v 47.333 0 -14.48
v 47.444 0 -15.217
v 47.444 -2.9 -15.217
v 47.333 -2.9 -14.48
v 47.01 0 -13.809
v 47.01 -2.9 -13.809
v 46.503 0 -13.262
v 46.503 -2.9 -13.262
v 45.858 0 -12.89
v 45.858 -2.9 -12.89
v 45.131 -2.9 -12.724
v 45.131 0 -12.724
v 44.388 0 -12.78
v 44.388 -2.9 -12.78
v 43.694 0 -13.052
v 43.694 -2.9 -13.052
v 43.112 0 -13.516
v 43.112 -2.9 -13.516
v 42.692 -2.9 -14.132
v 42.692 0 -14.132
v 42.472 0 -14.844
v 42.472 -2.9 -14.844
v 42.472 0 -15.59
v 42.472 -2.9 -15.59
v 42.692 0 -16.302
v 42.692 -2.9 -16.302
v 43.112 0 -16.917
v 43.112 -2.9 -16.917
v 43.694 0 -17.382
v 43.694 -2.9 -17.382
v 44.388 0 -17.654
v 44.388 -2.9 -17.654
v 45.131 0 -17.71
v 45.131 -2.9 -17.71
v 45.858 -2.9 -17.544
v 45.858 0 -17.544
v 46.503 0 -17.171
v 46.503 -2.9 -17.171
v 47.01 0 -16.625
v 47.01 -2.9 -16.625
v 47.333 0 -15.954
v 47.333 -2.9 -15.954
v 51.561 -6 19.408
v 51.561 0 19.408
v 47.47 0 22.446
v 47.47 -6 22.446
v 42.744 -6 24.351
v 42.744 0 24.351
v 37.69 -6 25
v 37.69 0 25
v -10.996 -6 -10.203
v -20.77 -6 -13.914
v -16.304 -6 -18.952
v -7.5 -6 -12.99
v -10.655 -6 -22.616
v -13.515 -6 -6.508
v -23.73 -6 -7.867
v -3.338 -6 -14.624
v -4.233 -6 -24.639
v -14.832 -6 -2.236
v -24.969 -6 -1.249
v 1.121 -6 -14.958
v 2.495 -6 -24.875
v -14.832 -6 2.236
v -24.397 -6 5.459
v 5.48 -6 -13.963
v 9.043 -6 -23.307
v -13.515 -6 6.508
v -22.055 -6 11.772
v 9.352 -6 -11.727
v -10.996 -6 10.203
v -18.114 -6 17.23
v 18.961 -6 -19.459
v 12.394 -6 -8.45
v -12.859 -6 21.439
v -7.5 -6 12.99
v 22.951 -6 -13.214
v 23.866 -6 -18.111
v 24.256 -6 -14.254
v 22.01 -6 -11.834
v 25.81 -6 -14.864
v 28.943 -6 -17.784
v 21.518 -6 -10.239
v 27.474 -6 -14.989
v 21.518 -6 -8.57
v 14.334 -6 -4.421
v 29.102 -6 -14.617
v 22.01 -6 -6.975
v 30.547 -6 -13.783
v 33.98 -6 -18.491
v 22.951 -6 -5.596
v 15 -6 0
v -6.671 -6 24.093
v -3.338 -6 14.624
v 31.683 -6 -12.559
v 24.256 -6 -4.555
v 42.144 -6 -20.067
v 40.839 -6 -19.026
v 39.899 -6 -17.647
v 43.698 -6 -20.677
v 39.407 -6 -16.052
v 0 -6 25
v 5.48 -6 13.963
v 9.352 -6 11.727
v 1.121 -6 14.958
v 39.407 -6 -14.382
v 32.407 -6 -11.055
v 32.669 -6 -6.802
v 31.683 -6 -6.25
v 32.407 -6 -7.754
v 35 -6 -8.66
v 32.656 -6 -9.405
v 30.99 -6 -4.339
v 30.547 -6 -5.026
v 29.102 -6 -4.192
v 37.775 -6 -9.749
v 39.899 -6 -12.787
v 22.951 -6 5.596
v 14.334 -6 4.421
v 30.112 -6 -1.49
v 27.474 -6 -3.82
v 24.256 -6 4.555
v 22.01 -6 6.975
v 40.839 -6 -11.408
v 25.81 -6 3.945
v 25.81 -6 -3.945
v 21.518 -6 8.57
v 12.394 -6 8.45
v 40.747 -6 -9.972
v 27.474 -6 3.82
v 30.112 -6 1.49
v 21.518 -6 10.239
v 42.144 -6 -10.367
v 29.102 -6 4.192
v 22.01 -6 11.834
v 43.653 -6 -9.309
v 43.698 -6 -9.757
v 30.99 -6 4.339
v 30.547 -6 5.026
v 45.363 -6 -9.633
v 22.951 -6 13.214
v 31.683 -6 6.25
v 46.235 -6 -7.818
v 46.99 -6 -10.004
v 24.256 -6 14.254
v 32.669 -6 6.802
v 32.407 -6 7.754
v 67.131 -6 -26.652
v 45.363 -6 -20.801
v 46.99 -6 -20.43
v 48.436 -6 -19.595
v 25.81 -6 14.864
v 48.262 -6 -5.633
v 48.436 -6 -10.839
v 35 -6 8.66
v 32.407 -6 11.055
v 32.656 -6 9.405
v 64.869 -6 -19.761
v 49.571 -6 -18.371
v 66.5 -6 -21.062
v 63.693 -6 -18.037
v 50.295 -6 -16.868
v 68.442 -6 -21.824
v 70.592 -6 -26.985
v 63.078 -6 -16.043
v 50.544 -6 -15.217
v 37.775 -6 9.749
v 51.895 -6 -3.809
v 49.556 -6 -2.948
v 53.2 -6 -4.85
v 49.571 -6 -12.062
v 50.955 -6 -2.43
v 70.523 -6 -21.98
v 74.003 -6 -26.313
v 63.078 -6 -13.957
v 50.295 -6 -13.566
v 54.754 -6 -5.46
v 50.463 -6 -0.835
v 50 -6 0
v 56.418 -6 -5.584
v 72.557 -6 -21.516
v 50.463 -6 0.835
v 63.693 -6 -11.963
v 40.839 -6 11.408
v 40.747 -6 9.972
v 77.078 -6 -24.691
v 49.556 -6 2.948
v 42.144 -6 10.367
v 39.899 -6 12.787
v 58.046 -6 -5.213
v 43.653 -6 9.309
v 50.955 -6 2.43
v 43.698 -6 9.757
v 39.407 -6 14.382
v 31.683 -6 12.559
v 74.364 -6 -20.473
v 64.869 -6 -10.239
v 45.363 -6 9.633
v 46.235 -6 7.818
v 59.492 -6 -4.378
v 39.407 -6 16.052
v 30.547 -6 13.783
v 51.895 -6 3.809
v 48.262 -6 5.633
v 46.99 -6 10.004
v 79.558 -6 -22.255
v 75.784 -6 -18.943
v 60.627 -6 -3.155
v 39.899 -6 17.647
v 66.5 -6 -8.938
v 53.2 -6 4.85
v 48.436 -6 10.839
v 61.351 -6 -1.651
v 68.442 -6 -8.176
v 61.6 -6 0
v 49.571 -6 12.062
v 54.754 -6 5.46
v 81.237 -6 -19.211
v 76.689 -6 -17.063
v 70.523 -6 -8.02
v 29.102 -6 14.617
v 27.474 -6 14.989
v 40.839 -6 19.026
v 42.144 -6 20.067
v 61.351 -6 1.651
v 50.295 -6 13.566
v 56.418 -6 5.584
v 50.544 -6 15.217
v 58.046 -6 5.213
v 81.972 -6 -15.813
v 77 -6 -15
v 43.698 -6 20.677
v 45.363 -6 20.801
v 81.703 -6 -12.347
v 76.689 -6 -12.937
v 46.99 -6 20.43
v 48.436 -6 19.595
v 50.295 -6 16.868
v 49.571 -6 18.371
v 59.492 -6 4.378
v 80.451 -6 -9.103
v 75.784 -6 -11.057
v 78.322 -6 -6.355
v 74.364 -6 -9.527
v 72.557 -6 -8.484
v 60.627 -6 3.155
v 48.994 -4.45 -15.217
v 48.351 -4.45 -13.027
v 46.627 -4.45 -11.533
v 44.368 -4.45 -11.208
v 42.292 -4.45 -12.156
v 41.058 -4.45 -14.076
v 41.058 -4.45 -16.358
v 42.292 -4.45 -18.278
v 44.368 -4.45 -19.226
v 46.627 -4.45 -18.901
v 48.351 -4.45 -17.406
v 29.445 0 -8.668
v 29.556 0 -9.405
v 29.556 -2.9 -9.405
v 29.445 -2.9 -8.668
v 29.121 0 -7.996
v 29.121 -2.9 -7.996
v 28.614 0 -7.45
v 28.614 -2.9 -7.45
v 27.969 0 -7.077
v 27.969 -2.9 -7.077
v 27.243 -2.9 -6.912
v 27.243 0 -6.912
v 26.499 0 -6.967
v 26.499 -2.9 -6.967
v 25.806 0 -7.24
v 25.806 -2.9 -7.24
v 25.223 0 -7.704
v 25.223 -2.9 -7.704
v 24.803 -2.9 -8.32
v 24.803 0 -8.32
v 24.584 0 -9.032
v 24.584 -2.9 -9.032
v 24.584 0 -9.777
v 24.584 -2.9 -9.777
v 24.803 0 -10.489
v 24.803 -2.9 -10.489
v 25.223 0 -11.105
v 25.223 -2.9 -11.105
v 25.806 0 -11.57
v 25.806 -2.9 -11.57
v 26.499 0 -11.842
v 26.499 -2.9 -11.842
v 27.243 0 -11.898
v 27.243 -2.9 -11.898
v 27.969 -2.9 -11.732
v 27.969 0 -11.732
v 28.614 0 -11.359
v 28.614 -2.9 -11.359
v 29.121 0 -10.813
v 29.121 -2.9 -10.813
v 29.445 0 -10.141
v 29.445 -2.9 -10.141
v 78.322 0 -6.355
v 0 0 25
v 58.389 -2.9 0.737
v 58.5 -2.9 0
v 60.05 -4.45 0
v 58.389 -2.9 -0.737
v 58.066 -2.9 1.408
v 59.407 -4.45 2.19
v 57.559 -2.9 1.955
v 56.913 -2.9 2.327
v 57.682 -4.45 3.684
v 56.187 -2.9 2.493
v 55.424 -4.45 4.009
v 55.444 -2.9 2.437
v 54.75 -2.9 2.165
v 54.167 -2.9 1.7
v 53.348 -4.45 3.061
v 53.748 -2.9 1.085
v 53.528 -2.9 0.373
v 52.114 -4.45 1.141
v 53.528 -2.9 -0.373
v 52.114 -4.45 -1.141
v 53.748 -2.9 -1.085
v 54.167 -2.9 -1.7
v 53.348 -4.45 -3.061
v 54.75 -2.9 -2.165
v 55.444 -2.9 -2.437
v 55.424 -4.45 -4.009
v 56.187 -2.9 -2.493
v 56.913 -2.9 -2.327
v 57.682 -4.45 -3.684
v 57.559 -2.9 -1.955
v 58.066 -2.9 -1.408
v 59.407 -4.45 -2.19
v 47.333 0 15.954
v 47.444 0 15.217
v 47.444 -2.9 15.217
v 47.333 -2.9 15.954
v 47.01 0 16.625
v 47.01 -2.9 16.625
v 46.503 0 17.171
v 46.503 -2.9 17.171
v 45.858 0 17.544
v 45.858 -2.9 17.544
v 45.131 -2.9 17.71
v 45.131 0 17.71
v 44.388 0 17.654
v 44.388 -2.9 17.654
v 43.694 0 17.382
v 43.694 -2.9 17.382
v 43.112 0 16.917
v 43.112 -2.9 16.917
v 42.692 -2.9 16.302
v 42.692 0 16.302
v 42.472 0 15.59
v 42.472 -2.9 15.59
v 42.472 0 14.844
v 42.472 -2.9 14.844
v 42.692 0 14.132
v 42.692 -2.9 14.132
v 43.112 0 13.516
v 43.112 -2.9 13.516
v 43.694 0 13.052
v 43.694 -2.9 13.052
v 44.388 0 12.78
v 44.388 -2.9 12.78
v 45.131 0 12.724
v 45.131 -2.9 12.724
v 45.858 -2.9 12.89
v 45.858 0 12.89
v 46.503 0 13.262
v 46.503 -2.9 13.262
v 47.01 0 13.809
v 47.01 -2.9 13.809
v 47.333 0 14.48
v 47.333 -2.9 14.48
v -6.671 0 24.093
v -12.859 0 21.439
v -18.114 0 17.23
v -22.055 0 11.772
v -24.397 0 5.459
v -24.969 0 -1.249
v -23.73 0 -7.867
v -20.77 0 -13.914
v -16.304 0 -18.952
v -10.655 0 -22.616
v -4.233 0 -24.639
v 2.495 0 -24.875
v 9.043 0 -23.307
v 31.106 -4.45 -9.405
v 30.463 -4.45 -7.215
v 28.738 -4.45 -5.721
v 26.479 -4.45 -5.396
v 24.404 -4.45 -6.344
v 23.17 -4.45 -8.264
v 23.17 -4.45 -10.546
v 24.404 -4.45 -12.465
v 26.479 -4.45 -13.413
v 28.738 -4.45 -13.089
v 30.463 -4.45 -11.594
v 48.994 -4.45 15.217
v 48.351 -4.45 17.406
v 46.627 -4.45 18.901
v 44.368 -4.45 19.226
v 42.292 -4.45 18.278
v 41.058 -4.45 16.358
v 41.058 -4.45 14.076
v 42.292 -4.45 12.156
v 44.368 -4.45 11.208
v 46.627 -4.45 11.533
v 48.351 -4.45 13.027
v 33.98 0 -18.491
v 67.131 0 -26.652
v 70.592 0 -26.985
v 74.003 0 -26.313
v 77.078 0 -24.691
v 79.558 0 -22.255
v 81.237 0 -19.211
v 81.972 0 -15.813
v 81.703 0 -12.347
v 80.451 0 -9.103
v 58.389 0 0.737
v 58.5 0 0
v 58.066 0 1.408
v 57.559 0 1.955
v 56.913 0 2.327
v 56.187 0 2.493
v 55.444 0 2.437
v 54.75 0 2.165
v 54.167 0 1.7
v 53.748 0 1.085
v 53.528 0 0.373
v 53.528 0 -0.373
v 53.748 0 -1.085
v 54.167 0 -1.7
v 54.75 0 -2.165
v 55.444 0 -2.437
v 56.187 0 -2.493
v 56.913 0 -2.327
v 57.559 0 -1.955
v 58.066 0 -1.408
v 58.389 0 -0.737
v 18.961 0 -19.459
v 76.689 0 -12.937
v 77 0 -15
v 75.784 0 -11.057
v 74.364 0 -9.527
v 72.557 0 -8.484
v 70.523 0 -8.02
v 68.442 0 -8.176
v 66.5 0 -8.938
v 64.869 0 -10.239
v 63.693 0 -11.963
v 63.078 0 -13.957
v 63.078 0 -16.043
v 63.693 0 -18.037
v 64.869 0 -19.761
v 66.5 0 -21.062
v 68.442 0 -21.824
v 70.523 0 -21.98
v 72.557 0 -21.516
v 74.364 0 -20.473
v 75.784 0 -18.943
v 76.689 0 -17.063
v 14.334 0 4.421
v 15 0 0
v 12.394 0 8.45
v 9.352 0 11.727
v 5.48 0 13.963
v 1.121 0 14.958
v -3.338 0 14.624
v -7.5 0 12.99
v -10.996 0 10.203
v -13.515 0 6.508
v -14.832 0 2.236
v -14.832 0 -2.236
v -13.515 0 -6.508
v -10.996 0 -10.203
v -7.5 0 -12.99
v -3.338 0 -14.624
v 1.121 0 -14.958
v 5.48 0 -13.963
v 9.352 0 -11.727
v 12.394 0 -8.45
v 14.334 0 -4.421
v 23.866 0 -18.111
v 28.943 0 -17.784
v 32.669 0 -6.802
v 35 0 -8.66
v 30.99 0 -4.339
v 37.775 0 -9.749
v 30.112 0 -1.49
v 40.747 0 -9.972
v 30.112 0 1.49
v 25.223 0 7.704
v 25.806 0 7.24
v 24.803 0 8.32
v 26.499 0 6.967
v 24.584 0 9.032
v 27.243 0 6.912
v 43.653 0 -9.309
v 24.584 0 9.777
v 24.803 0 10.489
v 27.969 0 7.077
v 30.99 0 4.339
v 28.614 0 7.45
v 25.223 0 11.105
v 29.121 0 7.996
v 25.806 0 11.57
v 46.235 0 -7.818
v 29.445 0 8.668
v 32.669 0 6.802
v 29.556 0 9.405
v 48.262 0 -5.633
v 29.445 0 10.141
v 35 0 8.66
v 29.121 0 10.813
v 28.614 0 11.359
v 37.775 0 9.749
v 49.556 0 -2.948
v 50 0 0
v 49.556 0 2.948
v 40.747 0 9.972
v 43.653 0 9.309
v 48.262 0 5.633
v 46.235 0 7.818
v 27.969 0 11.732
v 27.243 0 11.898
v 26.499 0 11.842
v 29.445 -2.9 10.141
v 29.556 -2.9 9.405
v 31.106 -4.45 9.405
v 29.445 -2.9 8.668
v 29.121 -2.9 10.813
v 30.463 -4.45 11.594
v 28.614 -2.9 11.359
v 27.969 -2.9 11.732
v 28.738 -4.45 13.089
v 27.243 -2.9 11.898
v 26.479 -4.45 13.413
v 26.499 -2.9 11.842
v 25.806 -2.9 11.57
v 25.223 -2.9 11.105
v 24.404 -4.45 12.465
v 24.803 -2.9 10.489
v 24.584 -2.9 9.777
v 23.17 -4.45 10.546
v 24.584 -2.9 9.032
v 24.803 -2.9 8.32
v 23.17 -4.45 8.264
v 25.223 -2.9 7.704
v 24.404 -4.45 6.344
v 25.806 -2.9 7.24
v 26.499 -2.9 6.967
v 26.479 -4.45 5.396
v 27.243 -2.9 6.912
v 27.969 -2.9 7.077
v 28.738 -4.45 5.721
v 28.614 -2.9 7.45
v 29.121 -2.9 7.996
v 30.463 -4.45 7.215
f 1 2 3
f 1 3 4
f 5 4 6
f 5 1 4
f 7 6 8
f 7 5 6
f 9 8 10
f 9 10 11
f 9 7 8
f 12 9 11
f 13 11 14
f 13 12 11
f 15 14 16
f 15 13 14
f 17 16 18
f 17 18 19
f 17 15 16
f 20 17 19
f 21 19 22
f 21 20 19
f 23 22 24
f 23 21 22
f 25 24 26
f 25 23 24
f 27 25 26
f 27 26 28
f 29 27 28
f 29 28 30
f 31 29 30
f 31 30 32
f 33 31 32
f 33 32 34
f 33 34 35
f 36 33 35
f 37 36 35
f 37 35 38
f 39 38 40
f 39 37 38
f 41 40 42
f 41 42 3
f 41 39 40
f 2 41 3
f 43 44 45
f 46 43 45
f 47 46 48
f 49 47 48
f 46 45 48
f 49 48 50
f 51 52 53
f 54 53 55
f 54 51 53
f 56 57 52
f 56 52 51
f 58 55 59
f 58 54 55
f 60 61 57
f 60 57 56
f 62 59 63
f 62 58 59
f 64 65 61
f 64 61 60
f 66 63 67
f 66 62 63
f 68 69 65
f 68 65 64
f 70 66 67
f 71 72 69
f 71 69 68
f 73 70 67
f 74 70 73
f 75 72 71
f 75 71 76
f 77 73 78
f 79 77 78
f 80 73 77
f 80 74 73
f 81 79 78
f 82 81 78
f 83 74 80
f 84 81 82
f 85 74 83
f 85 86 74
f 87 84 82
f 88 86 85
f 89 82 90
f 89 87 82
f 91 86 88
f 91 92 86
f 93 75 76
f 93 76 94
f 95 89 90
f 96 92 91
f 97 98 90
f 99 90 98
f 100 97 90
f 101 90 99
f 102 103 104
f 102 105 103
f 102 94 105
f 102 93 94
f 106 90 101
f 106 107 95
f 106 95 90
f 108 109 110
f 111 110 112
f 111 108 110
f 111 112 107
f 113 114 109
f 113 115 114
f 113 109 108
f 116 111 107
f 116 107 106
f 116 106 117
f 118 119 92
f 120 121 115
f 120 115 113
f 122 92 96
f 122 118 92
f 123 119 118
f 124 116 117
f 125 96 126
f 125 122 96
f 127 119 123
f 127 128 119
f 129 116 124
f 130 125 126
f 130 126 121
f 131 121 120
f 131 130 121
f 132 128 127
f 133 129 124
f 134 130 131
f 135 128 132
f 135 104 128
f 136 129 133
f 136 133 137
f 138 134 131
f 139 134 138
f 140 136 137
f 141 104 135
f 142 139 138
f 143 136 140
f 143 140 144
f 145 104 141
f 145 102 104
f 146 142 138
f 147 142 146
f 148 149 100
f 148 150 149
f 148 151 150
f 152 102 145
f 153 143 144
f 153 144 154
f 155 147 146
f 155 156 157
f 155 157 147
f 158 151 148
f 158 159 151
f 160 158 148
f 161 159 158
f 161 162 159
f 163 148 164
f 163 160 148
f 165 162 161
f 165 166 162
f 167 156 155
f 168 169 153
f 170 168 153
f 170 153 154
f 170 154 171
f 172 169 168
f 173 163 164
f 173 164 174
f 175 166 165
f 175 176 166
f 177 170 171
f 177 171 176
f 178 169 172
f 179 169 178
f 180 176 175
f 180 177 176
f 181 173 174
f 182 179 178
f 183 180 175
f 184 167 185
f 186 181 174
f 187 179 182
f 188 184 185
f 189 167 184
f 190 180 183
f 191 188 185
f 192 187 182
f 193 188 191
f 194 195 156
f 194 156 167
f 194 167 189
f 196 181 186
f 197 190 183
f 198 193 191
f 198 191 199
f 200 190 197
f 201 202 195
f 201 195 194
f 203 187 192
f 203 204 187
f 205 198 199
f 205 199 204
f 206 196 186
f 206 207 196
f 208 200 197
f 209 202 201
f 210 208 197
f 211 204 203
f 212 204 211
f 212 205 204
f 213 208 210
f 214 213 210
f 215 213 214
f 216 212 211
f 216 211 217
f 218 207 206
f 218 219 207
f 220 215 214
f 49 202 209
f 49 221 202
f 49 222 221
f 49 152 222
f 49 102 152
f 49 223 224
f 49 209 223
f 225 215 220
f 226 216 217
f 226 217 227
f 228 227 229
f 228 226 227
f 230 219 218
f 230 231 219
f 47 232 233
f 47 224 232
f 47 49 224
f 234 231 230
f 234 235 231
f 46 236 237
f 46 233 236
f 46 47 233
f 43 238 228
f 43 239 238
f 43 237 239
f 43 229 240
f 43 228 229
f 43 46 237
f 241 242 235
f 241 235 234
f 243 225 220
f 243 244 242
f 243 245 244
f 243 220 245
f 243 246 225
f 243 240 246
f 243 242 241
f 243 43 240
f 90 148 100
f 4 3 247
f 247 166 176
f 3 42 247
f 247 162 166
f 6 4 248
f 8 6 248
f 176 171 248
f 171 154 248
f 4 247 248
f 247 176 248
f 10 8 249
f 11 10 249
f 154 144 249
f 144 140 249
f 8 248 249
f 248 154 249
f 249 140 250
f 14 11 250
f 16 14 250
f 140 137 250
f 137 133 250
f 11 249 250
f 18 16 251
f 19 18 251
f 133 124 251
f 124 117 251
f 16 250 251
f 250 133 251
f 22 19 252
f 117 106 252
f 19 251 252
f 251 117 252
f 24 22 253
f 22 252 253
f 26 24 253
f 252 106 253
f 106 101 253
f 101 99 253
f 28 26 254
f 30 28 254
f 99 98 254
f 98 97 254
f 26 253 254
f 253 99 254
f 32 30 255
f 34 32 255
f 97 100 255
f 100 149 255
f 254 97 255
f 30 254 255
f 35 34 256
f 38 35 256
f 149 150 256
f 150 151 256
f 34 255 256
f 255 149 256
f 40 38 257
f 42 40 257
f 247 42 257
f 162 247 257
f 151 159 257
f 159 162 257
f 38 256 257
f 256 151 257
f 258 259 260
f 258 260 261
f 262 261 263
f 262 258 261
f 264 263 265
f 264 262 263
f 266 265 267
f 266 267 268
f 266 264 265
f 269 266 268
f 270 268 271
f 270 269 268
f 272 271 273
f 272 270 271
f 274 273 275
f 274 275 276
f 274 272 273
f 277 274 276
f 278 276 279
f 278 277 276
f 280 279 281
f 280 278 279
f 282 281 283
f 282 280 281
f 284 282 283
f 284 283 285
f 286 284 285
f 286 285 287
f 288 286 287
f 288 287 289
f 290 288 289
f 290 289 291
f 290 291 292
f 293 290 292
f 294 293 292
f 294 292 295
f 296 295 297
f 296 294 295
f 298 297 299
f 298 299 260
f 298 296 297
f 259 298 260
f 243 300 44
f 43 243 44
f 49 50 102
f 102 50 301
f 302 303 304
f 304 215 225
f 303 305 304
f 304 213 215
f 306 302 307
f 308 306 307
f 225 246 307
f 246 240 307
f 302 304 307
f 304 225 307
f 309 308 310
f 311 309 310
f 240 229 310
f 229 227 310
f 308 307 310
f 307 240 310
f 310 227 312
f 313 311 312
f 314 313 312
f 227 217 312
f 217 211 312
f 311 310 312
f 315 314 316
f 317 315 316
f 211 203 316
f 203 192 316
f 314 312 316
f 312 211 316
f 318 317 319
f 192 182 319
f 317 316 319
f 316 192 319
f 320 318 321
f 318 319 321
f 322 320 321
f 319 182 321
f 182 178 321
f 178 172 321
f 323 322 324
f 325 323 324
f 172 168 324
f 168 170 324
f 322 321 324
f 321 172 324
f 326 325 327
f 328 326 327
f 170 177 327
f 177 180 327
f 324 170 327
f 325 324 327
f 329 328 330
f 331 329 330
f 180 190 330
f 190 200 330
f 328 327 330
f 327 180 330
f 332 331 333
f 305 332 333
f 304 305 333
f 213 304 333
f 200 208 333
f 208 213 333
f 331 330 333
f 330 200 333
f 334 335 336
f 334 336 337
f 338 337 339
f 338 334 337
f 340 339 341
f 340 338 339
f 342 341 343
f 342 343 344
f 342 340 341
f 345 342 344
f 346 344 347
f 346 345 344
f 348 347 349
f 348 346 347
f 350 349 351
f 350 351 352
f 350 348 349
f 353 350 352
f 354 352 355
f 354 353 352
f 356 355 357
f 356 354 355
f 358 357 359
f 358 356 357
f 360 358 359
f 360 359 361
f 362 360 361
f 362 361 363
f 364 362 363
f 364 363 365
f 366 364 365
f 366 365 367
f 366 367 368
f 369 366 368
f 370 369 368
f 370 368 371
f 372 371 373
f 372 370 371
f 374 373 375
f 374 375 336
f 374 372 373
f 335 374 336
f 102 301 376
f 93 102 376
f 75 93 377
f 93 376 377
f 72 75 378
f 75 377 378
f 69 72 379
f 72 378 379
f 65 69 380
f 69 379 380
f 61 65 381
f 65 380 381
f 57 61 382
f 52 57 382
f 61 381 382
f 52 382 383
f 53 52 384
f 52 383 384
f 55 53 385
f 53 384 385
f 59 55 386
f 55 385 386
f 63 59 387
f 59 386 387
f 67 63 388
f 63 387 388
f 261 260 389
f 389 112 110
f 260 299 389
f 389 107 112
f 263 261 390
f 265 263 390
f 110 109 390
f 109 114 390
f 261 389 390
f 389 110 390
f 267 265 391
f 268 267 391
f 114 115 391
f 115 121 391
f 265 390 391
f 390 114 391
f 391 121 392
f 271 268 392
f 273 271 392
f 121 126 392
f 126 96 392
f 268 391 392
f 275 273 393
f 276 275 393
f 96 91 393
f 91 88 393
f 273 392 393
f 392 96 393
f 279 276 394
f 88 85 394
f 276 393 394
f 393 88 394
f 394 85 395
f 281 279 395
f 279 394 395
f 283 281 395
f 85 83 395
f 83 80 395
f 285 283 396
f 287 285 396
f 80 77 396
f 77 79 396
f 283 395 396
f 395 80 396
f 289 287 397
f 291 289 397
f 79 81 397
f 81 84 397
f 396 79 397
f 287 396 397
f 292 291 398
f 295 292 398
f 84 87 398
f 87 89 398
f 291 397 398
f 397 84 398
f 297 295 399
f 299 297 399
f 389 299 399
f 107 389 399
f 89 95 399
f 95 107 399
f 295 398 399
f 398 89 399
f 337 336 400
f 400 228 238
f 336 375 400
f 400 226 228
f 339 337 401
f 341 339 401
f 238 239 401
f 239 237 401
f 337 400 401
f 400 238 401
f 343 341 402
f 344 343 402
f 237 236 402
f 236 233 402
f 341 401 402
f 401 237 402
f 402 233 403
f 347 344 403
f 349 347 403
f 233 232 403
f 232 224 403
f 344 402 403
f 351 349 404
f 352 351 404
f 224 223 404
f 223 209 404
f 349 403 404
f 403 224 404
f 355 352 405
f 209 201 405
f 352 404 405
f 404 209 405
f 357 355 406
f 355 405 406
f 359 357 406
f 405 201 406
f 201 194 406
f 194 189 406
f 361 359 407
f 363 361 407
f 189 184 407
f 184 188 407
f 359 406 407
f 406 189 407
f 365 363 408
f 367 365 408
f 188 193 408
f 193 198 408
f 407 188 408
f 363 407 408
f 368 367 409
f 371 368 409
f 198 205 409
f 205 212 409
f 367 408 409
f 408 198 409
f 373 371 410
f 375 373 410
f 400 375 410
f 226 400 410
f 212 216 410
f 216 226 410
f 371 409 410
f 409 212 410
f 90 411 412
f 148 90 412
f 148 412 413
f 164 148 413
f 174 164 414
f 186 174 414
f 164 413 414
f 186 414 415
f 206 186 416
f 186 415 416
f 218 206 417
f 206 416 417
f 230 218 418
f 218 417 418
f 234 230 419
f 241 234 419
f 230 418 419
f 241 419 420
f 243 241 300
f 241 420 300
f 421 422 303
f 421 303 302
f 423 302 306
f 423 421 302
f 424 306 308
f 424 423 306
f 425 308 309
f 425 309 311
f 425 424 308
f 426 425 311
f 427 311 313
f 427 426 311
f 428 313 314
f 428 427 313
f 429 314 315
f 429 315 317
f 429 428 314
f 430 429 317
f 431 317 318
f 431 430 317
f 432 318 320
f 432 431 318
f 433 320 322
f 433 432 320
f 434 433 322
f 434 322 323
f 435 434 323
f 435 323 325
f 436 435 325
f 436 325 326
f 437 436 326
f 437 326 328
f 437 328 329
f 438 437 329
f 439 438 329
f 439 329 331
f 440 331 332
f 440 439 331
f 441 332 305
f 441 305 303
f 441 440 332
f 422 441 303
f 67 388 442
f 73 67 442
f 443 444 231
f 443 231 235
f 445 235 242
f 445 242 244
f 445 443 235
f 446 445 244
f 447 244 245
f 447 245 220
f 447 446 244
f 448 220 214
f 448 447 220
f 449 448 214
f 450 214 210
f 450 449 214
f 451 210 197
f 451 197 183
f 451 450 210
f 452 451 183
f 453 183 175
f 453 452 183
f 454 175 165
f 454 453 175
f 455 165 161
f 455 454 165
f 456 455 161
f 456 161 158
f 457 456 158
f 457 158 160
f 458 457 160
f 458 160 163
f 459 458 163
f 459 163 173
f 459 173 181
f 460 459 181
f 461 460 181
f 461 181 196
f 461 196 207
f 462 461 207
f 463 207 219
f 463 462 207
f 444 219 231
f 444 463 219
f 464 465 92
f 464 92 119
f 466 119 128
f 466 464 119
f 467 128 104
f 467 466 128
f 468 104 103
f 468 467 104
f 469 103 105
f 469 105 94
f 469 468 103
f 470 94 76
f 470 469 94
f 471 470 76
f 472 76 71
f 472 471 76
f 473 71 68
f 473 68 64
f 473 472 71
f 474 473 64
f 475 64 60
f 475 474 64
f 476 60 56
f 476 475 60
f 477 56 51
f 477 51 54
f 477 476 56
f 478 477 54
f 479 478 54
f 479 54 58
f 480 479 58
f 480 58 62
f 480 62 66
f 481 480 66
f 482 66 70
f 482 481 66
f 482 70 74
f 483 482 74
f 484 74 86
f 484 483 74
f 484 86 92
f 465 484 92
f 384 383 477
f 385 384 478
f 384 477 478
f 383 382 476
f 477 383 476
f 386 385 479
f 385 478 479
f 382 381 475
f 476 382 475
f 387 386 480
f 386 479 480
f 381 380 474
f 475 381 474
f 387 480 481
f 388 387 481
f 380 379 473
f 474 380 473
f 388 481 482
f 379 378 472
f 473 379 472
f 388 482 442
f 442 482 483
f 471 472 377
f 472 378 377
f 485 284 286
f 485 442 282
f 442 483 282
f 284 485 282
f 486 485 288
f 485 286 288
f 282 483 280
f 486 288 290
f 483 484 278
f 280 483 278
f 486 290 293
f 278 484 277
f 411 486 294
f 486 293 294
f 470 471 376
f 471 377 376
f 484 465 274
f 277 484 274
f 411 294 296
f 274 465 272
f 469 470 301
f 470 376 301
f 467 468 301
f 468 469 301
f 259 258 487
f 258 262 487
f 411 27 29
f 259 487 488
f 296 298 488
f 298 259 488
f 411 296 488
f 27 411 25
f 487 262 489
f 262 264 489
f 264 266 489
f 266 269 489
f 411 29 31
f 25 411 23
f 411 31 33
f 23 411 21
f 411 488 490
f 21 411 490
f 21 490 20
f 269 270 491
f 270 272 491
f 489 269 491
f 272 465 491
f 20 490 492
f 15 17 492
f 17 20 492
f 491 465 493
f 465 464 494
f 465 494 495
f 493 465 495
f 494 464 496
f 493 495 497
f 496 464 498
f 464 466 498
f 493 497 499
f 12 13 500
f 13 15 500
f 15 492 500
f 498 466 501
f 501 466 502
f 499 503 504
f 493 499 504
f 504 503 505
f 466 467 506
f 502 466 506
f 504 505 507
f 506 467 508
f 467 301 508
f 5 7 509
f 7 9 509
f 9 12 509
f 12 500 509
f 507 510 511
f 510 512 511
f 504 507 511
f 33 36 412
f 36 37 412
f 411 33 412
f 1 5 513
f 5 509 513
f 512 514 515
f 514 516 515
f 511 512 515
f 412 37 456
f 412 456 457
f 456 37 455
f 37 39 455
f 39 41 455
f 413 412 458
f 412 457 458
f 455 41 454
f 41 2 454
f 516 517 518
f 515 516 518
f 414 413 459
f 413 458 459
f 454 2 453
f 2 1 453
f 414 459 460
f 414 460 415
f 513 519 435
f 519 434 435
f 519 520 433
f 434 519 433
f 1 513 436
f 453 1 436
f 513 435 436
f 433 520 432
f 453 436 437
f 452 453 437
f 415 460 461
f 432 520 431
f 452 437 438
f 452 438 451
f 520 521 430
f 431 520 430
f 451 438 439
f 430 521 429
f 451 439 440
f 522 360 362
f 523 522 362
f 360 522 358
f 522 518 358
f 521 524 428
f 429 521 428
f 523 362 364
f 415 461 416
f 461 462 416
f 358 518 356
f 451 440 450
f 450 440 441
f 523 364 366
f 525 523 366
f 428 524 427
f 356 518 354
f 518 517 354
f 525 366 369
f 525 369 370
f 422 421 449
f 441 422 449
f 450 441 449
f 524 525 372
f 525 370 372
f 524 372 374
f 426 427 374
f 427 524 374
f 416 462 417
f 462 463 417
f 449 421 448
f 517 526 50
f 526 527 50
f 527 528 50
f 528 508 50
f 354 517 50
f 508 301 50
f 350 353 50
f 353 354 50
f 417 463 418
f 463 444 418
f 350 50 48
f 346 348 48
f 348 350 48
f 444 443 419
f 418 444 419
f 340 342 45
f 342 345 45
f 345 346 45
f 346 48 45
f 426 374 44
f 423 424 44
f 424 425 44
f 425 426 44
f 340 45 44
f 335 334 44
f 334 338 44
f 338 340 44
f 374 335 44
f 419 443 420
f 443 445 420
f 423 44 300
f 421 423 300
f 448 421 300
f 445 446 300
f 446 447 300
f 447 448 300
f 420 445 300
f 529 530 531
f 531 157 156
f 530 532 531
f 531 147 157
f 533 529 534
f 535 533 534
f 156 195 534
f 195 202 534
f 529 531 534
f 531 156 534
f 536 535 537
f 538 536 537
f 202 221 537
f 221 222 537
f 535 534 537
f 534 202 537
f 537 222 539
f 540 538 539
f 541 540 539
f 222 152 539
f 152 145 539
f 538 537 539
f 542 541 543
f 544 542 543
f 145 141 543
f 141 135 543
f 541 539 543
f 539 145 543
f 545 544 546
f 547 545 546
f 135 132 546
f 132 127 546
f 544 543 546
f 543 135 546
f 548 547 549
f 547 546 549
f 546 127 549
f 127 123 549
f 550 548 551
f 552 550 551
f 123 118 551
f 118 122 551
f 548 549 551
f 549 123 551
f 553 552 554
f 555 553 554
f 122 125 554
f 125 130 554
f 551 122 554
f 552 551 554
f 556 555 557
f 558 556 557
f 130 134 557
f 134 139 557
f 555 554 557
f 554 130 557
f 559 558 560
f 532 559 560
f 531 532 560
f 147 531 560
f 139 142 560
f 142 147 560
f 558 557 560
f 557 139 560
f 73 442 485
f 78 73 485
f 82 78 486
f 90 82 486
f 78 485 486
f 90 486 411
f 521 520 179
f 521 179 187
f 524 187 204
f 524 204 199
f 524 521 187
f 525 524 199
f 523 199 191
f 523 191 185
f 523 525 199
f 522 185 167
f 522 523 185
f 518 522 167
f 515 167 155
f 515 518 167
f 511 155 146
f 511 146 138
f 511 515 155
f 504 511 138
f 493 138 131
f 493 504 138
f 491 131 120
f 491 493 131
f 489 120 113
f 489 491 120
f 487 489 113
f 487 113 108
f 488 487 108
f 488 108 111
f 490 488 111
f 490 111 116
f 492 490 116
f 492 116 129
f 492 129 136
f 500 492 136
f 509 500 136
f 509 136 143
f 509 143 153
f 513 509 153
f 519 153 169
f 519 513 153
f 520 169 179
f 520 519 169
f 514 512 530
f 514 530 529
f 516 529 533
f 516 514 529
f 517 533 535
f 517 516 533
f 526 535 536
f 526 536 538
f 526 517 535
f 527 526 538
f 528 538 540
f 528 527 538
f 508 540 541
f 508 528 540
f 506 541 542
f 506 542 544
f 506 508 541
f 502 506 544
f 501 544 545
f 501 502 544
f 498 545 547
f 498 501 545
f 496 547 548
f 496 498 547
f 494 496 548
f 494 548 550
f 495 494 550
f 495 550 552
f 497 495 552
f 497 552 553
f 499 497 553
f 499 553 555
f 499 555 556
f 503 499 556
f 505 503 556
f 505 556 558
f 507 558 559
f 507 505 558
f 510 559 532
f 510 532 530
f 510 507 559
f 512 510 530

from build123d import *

# Parameters (mm, degrees)
F0_R     = 2.5
F0_R_2   = 7
F0_R_3   = 15
F0_R_4   = 10
F1_DEPTH = 6
F2_SIZE  = 3.1


with BuildPart() as f1:
    # F0 (on Front) → F1 (new body)
    with BuildSketch(Plane.XZ):
        with BuildLine():
            Line((37.689998, 25), (0, 25))
            ThreePointArc((0, 25), (-24.573155, -4.600004), (9.042928, -23.307197))
            Line((9.042928, -23.307197), (18.961279, -19.45899))
            ThreePointArc((18.961279, -19.45899), (26.3962, -17.817954), (33.98027, -18.49096))
            Line((33.98027, -18.49096), (67.13149, -26.652109))
            ThreePointArc((67.13149, -26.652109), (80.508551, -20.793993), (78.322499, -6.355001))
            Line((78.322499, -6.355001), (51.56083, 19.408331))
            ThreePointArc((51.56083, 19.408331), (45.167744, 23.549483), (37.689998, 25))
        make_face()
        with Locations((27.055728, -9.404564)):
            Circle(F0_R, mode=Mode.SUBTRACT)
        with Locations((44.944272, -15.216904)):
            Circle(F0_R, mode=Mode.SUBTRACT)
        with Locations((70, -15)):
            Circle(F0_R_2, mode=Mode.SUBTRACT)
        Circle(F0_R_3, mode=Mode.SUBTRACT)
        with Locations((27.055728, 9.404564)):
            Circle(F0_R, mode=Mode.SUBTRACT)
        with Locations((40, 0)):
            Circle(F0_R_4, mode=Mode.SUBTRACT)
        with Locations((56, 0)):
            Circle(F0_R, mode=Mode.SUBTRACT)
        with Locations((44.944272, 15.216904)):
            Circle(F0_R, mode=Mode.SUBTRACT)
    extrude(amount=F1_DEPTH)

    # F2
    f2_edges = [f1.edges().sort_by_distance(p)[0] for p in [
        (24.555728, -6, -9.404564),
        (24.555728, -6, 9.404564),
        (42.444272, -6, 15.216904),
        (53.5, -6, 0),
        (42.444272, -6, -15.216904),
    ]]
    chamfer(f2_edges, length=F2_SIZE)


solid = f1.part
